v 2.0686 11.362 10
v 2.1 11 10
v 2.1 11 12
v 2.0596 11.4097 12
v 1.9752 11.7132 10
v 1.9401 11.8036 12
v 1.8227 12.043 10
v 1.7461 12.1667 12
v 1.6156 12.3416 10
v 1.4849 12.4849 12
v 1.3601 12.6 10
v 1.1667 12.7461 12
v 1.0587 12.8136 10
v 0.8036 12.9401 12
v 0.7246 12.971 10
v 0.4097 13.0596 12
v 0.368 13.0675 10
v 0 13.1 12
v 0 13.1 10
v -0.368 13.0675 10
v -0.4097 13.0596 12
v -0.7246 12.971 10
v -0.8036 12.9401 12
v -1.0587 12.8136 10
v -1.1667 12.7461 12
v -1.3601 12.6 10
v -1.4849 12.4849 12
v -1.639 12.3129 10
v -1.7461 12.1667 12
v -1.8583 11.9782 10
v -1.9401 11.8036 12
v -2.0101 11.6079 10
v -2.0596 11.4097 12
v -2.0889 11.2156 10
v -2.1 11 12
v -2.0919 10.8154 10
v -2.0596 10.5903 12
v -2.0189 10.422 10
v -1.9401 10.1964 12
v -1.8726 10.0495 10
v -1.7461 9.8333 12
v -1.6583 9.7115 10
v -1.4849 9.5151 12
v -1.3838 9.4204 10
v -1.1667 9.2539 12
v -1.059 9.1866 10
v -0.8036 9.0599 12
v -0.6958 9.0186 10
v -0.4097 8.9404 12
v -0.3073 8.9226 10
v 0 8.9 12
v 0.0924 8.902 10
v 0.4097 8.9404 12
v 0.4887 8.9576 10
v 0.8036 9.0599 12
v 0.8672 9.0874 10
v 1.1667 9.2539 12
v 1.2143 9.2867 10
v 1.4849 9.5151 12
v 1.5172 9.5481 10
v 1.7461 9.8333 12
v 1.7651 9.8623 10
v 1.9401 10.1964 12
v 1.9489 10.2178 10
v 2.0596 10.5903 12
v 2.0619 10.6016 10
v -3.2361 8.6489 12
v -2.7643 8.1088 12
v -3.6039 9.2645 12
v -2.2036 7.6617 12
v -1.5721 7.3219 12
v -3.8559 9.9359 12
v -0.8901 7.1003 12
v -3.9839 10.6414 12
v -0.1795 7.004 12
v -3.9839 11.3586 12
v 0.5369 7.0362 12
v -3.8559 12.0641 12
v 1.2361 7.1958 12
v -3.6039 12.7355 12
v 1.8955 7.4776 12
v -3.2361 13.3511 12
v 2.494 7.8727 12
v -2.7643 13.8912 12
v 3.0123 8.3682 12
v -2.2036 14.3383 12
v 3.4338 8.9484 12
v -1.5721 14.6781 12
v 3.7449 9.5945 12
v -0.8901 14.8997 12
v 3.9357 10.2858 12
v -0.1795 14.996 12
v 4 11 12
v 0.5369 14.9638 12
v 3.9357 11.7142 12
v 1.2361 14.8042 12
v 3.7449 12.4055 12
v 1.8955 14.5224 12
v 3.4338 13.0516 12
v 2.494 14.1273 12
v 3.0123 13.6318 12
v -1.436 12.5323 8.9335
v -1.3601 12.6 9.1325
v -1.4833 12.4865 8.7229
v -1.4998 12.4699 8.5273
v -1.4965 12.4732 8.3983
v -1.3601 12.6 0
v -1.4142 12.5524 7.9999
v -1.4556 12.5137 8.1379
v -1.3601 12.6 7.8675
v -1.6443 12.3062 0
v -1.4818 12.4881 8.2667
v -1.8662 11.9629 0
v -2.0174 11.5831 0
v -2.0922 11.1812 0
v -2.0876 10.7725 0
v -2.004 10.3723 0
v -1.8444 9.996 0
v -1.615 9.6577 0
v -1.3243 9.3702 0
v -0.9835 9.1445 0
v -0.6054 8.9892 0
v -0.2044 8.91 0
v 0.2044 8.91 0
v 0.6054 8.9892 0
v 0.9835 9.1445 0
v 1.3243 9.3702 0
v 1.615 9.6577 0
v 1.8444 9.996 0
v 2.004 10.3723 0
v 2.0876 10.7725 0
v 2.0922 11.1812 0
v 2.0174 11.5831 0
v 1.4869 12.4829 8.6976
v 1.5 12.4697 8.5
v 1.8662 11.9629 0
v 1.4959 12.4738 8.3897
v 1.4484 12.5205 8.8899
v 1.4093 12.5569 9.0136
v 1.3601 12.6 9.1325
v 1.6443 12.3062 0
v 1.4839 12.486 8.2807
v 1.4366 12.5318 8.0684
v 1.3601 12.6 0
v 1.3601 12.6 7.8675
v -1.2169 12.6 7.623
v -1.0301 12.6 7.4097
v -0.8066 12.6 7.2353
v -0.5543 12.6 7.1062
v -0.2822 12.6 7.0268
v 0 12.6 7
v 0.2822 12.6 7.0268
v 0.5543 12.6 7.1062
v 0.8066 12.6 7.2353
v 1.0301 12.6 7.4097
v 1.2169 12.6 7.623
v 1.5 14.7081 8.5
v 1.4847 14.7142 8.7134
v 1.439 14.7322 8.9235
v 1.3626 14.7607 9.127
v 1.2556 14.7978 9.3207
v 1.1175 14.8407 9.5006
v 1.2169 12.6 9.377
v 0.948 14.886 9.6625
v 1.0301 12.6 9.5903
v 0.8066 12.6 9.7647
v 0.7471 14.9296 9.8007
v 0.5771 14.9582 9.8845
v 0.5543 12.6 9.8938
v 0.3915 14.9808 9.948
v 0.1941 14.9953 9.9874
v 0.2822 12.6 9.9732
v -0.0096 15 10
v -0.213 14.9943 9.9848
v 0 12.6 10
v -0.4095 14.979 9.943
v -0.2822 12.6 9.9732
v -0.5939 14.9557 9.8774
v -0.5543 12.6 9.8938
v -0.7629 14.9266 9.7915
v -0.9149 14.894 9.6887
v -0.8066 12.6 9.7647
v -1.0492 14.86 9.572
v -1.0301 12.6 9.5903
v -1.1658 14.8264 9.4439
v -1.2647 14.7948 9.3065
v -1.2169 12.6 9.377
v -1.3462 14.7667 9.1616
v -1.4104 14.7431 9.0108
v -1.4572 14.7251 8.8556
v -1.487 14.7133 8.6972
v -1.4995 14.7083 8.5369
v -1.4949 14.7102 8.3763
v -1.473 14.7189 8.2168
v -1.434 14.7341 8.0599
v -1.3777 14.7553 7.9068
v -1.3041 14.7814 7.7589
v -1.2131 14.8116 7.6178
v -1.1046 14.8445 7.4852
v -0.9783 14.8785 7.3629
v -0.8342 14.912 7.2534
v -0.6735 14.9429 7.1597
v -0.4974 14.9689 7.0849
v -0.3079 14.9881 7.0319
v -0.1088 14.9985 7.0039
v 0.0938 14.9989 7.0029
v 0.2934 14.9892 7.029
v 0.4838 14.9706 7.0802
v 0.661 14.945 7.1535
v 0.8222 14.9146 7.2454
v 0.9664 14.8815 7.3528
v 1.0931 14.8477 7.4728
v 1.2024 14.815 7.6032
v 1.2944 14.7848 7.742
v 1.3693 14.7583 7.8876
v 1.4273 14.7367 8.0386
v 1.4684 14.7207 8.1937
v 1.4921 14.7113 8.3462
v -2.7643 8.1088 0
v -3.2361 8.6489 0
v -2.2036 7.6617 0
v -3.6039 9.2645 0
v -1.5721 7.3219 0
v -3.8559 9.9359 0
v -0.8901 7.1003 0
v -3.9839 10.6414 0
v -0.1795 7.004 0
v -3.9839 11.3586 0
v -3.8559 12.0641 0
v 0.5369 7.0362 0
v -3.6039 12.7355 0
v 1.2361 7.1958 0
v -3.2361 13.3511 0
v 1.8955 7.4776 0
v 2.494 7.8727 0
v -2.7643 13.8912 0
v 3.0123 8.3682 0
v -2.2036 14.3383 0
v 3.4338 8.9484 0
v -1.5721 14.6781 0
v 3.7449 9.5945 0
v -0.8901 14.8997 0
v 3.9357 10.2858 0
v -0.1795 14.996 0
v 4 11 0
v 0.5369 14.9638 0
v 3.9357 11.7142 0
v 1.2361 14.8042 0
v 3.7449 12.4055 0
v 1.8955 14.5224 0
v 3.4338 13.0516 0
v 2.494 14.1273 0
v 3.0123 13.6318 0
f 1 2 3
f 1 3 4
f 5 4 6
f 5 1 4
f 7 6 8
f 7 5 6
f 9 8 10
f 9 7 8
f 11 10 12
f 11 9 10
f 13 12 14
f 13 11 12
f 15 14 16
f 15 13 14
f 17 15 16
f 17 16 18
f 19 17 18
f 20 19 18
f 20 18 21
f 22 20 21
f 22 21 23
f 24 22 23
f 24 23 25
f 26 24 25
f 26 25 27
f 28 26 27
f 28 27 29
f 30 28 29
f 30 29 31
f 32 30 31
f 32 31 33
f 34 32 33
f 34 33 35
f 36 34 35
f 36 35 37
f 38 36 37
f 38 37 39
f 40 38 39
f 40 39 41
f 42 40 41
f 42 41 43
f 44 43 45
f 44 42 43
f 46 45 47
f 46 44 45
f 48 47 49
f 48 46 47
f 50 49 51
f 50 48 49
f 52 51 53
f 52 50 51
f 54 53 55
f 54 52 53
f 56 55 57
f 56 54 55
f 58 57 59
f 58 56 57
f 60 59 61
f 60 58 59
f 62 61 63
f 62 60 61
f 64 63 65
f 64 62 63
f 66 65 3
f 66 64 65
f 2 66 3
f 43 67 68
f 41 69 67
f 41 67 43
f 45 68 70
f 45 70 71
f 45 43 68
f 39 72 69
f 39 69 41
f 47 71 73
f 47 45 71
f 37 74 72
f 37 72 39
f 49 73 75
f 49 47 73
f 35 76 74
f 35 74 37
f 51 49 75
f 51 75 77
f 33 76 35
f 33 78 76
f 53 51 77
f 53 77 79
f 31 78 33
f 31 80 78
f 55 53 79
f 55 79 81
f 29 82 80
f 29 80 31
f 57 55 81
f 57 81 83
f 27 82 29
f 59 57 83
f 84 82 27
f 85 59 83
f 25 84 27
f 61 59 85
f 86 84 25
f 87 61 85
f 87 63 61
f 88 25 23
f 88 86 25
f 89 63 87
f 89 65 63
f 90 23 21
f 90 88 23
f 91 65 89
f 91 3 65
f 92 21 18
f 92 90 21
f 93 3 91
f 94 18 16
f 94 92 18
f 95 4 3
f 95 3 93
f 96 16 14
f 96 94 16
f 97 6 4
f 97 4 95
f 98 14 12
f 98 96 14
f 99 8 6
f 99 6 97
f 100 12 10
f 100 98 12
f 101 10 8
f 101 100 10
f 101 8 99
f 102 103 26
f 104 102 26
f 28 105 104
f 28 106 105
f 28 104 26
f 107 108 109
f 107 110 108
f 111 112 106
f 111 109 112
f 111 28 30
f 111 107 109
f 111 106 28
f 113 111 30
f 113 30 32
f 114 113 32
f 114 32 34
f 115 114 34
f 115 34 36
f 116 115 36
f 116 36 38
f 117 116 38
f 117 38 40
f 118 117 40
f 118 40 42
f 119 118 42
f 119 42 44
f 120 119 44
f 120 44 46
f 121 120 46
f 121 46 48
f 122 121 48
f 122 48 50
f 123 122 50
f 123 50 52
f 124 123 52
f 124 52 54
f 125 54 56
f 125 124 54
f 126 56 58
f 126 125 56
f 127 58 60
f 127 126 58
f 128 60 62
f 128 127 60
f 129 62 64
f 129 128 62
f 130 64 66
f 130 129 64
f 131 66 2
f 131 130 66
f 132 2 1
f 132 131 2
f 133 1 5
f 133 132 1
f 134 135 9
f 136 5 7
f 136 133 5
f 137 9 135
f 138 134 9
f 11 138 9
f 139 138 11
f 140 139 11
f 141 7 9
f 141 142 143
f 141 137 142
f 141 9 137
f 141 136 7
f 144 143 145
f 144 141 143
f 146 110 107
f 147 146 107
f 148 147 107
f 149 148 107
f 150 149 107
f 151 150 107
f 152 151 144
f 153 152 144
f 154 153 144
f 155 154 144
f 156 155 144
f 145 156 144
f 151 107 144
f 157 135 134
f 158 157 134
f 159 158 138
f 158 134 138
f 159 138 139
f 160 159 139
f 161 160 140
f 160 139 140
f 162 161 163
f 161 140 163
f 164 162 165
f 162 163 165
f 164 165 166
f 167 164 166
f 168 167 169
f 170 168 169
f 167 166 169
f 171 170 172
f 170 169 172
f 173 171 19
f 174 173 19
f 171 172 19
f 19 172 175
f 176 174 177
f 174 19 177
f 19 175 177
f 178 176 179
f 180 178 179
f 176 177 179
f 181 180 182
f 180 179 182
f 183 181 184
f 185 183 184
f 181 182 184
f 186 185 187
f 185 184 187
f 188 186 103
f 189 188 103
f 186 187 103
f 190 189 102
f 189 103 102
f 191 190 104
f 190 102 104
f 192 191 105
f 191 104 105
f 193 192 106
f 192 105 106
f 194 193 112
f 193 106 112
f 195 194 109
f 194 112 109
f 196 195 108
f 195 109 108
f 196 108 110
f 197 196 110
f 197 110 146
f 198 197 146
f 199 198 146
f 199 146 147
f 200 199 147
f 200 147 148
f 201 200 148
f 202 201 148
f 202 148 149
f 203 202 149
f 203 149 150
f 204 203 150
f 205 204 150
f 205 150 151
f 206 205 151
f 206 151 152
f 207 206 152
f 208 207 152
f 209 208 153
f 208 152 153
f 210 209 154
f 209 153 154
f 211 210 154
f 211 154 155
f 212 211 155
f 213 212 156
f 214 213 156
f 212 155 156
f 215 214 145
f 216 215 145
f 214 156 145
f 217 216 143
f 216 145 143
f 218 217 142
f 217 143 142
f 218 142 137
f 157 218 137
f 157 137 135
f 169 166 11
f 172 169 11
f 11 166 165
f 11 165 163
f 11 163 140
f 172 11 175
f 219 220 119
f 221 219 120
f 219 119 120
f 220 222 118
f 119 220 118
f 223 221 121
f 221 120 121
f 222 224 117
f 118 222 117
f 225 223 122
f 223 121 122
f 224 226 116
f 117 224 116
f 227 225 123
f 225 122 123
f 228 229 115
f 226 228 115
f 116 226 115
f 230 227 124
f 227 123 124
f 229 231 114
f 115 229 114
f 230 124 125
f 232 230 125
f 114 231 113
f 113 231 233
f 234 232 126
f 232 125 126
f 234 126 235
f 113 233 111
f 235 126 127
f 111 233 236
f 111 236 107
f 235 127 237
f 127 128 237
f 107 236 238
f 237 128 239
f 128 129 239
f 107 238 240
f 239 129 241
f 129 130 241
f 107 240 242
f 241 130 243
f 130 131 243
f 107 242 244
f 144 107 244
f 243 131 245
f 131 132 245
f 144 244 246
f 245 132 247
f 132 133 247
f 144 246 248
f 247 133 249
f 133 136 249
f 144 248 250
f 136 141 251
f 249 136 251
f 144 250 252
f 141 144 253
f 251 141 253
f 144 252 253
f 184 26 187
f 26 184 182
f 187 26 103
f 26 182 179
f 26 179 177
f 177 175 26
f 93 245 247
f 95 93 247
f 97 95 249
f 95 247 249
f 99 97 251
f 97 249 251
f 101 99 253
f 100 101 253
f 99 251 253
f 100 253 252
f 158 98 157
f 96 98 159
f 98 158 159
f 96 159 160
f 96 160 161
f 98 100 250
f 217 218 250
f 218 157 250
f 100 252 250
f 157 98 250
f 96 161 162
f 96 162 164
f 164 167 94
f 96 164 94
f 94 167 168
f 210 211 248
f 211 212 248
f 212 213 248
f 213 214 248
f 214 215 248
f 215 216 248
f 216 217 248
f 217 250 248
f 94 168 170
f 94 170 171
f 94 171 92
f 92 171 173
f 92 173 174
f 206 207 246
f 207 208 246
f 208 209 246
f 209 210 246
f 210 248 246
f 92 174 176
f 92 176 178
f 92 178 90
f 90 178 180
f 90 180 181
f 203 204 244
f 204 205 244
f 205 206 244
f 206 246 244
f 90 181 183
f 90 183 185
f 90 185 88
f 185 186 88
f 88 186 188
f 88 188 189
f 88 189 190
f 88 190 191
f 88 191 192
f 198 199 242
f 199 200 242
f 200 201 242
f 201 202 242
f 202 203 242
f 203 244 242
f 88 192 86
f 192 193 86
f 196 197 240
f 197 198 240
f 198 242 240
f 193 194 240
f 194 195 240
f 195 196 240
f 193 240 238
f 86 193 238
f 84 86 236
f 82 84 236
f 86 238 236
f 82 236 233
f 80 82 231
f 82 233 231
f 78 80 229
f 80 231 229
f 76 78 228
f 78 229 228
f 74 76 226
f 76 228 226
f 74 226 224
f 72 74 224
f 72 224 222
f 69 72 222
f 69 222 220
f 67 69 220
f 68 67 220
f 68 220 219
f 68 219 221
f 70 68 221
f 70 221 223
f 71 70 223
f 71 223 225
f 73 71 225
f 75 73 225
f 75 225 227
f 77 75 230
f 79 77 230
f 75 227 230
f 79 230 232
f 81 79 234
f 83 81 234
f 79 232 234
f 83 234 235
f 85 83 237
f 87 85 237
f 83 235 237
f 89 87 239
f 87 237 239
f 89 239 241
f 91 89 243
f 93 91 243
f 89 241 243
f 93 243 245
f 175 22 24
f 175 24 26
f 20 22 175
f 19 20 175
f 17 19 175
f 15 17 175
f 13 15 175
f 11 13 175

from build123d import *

# Parameters (mm, degrees)
SKETCH271_R     = 4
PAD109_DEPTH    = 10
SKETCH272_R     = 4
SKETCH272_R_2   = 2.1
PAD110_DEPTH    = 2
SKETCH273_R     = 1.5
POCKET132_DEPTH = 4.001


with BuildPart() as part:
    # Sketch271 → Pad109 (new body)
    with BuildSketch(Plane.XY):
        Circle(SKETCH271_R)
        with BuildLine():
            Line((-1.360147, 1.6), (1.360147, 1.6))
            ThreePointArc((-1.360147, 1.6), (0, -2.1), (1.360147, 1.6))
        make_face(mode=Mode.SUBTRACT)
    extrude(amount=PAD109_DEPTH)

    # Sketch272 (on Face5 of Pad109) → Pad110 (join)
    with BuildSketch(Plane.XY.offset(10)):
        Circle(SKETCH272_R)
        Circle(SKETCH272_R_2, mode=Mode.SUBTRACT)
    extrude(amount=PAD110_DEPTH)

    # Sketch273 → Pocket132 (cut, through all)
    with BuildSketch(Plane.XZ):
        with Locations((0, 8.5)):
            Circle(SKETCH273_R)
    extrude(amount=-POCKET132_DEPTH, mode=Mode.SUBTRACT)


with BuildPart() as part_1:
    # Body097 placement: moved
    add(part.part.moved(Location((0, 11, 0))))


solid = part_1.part
